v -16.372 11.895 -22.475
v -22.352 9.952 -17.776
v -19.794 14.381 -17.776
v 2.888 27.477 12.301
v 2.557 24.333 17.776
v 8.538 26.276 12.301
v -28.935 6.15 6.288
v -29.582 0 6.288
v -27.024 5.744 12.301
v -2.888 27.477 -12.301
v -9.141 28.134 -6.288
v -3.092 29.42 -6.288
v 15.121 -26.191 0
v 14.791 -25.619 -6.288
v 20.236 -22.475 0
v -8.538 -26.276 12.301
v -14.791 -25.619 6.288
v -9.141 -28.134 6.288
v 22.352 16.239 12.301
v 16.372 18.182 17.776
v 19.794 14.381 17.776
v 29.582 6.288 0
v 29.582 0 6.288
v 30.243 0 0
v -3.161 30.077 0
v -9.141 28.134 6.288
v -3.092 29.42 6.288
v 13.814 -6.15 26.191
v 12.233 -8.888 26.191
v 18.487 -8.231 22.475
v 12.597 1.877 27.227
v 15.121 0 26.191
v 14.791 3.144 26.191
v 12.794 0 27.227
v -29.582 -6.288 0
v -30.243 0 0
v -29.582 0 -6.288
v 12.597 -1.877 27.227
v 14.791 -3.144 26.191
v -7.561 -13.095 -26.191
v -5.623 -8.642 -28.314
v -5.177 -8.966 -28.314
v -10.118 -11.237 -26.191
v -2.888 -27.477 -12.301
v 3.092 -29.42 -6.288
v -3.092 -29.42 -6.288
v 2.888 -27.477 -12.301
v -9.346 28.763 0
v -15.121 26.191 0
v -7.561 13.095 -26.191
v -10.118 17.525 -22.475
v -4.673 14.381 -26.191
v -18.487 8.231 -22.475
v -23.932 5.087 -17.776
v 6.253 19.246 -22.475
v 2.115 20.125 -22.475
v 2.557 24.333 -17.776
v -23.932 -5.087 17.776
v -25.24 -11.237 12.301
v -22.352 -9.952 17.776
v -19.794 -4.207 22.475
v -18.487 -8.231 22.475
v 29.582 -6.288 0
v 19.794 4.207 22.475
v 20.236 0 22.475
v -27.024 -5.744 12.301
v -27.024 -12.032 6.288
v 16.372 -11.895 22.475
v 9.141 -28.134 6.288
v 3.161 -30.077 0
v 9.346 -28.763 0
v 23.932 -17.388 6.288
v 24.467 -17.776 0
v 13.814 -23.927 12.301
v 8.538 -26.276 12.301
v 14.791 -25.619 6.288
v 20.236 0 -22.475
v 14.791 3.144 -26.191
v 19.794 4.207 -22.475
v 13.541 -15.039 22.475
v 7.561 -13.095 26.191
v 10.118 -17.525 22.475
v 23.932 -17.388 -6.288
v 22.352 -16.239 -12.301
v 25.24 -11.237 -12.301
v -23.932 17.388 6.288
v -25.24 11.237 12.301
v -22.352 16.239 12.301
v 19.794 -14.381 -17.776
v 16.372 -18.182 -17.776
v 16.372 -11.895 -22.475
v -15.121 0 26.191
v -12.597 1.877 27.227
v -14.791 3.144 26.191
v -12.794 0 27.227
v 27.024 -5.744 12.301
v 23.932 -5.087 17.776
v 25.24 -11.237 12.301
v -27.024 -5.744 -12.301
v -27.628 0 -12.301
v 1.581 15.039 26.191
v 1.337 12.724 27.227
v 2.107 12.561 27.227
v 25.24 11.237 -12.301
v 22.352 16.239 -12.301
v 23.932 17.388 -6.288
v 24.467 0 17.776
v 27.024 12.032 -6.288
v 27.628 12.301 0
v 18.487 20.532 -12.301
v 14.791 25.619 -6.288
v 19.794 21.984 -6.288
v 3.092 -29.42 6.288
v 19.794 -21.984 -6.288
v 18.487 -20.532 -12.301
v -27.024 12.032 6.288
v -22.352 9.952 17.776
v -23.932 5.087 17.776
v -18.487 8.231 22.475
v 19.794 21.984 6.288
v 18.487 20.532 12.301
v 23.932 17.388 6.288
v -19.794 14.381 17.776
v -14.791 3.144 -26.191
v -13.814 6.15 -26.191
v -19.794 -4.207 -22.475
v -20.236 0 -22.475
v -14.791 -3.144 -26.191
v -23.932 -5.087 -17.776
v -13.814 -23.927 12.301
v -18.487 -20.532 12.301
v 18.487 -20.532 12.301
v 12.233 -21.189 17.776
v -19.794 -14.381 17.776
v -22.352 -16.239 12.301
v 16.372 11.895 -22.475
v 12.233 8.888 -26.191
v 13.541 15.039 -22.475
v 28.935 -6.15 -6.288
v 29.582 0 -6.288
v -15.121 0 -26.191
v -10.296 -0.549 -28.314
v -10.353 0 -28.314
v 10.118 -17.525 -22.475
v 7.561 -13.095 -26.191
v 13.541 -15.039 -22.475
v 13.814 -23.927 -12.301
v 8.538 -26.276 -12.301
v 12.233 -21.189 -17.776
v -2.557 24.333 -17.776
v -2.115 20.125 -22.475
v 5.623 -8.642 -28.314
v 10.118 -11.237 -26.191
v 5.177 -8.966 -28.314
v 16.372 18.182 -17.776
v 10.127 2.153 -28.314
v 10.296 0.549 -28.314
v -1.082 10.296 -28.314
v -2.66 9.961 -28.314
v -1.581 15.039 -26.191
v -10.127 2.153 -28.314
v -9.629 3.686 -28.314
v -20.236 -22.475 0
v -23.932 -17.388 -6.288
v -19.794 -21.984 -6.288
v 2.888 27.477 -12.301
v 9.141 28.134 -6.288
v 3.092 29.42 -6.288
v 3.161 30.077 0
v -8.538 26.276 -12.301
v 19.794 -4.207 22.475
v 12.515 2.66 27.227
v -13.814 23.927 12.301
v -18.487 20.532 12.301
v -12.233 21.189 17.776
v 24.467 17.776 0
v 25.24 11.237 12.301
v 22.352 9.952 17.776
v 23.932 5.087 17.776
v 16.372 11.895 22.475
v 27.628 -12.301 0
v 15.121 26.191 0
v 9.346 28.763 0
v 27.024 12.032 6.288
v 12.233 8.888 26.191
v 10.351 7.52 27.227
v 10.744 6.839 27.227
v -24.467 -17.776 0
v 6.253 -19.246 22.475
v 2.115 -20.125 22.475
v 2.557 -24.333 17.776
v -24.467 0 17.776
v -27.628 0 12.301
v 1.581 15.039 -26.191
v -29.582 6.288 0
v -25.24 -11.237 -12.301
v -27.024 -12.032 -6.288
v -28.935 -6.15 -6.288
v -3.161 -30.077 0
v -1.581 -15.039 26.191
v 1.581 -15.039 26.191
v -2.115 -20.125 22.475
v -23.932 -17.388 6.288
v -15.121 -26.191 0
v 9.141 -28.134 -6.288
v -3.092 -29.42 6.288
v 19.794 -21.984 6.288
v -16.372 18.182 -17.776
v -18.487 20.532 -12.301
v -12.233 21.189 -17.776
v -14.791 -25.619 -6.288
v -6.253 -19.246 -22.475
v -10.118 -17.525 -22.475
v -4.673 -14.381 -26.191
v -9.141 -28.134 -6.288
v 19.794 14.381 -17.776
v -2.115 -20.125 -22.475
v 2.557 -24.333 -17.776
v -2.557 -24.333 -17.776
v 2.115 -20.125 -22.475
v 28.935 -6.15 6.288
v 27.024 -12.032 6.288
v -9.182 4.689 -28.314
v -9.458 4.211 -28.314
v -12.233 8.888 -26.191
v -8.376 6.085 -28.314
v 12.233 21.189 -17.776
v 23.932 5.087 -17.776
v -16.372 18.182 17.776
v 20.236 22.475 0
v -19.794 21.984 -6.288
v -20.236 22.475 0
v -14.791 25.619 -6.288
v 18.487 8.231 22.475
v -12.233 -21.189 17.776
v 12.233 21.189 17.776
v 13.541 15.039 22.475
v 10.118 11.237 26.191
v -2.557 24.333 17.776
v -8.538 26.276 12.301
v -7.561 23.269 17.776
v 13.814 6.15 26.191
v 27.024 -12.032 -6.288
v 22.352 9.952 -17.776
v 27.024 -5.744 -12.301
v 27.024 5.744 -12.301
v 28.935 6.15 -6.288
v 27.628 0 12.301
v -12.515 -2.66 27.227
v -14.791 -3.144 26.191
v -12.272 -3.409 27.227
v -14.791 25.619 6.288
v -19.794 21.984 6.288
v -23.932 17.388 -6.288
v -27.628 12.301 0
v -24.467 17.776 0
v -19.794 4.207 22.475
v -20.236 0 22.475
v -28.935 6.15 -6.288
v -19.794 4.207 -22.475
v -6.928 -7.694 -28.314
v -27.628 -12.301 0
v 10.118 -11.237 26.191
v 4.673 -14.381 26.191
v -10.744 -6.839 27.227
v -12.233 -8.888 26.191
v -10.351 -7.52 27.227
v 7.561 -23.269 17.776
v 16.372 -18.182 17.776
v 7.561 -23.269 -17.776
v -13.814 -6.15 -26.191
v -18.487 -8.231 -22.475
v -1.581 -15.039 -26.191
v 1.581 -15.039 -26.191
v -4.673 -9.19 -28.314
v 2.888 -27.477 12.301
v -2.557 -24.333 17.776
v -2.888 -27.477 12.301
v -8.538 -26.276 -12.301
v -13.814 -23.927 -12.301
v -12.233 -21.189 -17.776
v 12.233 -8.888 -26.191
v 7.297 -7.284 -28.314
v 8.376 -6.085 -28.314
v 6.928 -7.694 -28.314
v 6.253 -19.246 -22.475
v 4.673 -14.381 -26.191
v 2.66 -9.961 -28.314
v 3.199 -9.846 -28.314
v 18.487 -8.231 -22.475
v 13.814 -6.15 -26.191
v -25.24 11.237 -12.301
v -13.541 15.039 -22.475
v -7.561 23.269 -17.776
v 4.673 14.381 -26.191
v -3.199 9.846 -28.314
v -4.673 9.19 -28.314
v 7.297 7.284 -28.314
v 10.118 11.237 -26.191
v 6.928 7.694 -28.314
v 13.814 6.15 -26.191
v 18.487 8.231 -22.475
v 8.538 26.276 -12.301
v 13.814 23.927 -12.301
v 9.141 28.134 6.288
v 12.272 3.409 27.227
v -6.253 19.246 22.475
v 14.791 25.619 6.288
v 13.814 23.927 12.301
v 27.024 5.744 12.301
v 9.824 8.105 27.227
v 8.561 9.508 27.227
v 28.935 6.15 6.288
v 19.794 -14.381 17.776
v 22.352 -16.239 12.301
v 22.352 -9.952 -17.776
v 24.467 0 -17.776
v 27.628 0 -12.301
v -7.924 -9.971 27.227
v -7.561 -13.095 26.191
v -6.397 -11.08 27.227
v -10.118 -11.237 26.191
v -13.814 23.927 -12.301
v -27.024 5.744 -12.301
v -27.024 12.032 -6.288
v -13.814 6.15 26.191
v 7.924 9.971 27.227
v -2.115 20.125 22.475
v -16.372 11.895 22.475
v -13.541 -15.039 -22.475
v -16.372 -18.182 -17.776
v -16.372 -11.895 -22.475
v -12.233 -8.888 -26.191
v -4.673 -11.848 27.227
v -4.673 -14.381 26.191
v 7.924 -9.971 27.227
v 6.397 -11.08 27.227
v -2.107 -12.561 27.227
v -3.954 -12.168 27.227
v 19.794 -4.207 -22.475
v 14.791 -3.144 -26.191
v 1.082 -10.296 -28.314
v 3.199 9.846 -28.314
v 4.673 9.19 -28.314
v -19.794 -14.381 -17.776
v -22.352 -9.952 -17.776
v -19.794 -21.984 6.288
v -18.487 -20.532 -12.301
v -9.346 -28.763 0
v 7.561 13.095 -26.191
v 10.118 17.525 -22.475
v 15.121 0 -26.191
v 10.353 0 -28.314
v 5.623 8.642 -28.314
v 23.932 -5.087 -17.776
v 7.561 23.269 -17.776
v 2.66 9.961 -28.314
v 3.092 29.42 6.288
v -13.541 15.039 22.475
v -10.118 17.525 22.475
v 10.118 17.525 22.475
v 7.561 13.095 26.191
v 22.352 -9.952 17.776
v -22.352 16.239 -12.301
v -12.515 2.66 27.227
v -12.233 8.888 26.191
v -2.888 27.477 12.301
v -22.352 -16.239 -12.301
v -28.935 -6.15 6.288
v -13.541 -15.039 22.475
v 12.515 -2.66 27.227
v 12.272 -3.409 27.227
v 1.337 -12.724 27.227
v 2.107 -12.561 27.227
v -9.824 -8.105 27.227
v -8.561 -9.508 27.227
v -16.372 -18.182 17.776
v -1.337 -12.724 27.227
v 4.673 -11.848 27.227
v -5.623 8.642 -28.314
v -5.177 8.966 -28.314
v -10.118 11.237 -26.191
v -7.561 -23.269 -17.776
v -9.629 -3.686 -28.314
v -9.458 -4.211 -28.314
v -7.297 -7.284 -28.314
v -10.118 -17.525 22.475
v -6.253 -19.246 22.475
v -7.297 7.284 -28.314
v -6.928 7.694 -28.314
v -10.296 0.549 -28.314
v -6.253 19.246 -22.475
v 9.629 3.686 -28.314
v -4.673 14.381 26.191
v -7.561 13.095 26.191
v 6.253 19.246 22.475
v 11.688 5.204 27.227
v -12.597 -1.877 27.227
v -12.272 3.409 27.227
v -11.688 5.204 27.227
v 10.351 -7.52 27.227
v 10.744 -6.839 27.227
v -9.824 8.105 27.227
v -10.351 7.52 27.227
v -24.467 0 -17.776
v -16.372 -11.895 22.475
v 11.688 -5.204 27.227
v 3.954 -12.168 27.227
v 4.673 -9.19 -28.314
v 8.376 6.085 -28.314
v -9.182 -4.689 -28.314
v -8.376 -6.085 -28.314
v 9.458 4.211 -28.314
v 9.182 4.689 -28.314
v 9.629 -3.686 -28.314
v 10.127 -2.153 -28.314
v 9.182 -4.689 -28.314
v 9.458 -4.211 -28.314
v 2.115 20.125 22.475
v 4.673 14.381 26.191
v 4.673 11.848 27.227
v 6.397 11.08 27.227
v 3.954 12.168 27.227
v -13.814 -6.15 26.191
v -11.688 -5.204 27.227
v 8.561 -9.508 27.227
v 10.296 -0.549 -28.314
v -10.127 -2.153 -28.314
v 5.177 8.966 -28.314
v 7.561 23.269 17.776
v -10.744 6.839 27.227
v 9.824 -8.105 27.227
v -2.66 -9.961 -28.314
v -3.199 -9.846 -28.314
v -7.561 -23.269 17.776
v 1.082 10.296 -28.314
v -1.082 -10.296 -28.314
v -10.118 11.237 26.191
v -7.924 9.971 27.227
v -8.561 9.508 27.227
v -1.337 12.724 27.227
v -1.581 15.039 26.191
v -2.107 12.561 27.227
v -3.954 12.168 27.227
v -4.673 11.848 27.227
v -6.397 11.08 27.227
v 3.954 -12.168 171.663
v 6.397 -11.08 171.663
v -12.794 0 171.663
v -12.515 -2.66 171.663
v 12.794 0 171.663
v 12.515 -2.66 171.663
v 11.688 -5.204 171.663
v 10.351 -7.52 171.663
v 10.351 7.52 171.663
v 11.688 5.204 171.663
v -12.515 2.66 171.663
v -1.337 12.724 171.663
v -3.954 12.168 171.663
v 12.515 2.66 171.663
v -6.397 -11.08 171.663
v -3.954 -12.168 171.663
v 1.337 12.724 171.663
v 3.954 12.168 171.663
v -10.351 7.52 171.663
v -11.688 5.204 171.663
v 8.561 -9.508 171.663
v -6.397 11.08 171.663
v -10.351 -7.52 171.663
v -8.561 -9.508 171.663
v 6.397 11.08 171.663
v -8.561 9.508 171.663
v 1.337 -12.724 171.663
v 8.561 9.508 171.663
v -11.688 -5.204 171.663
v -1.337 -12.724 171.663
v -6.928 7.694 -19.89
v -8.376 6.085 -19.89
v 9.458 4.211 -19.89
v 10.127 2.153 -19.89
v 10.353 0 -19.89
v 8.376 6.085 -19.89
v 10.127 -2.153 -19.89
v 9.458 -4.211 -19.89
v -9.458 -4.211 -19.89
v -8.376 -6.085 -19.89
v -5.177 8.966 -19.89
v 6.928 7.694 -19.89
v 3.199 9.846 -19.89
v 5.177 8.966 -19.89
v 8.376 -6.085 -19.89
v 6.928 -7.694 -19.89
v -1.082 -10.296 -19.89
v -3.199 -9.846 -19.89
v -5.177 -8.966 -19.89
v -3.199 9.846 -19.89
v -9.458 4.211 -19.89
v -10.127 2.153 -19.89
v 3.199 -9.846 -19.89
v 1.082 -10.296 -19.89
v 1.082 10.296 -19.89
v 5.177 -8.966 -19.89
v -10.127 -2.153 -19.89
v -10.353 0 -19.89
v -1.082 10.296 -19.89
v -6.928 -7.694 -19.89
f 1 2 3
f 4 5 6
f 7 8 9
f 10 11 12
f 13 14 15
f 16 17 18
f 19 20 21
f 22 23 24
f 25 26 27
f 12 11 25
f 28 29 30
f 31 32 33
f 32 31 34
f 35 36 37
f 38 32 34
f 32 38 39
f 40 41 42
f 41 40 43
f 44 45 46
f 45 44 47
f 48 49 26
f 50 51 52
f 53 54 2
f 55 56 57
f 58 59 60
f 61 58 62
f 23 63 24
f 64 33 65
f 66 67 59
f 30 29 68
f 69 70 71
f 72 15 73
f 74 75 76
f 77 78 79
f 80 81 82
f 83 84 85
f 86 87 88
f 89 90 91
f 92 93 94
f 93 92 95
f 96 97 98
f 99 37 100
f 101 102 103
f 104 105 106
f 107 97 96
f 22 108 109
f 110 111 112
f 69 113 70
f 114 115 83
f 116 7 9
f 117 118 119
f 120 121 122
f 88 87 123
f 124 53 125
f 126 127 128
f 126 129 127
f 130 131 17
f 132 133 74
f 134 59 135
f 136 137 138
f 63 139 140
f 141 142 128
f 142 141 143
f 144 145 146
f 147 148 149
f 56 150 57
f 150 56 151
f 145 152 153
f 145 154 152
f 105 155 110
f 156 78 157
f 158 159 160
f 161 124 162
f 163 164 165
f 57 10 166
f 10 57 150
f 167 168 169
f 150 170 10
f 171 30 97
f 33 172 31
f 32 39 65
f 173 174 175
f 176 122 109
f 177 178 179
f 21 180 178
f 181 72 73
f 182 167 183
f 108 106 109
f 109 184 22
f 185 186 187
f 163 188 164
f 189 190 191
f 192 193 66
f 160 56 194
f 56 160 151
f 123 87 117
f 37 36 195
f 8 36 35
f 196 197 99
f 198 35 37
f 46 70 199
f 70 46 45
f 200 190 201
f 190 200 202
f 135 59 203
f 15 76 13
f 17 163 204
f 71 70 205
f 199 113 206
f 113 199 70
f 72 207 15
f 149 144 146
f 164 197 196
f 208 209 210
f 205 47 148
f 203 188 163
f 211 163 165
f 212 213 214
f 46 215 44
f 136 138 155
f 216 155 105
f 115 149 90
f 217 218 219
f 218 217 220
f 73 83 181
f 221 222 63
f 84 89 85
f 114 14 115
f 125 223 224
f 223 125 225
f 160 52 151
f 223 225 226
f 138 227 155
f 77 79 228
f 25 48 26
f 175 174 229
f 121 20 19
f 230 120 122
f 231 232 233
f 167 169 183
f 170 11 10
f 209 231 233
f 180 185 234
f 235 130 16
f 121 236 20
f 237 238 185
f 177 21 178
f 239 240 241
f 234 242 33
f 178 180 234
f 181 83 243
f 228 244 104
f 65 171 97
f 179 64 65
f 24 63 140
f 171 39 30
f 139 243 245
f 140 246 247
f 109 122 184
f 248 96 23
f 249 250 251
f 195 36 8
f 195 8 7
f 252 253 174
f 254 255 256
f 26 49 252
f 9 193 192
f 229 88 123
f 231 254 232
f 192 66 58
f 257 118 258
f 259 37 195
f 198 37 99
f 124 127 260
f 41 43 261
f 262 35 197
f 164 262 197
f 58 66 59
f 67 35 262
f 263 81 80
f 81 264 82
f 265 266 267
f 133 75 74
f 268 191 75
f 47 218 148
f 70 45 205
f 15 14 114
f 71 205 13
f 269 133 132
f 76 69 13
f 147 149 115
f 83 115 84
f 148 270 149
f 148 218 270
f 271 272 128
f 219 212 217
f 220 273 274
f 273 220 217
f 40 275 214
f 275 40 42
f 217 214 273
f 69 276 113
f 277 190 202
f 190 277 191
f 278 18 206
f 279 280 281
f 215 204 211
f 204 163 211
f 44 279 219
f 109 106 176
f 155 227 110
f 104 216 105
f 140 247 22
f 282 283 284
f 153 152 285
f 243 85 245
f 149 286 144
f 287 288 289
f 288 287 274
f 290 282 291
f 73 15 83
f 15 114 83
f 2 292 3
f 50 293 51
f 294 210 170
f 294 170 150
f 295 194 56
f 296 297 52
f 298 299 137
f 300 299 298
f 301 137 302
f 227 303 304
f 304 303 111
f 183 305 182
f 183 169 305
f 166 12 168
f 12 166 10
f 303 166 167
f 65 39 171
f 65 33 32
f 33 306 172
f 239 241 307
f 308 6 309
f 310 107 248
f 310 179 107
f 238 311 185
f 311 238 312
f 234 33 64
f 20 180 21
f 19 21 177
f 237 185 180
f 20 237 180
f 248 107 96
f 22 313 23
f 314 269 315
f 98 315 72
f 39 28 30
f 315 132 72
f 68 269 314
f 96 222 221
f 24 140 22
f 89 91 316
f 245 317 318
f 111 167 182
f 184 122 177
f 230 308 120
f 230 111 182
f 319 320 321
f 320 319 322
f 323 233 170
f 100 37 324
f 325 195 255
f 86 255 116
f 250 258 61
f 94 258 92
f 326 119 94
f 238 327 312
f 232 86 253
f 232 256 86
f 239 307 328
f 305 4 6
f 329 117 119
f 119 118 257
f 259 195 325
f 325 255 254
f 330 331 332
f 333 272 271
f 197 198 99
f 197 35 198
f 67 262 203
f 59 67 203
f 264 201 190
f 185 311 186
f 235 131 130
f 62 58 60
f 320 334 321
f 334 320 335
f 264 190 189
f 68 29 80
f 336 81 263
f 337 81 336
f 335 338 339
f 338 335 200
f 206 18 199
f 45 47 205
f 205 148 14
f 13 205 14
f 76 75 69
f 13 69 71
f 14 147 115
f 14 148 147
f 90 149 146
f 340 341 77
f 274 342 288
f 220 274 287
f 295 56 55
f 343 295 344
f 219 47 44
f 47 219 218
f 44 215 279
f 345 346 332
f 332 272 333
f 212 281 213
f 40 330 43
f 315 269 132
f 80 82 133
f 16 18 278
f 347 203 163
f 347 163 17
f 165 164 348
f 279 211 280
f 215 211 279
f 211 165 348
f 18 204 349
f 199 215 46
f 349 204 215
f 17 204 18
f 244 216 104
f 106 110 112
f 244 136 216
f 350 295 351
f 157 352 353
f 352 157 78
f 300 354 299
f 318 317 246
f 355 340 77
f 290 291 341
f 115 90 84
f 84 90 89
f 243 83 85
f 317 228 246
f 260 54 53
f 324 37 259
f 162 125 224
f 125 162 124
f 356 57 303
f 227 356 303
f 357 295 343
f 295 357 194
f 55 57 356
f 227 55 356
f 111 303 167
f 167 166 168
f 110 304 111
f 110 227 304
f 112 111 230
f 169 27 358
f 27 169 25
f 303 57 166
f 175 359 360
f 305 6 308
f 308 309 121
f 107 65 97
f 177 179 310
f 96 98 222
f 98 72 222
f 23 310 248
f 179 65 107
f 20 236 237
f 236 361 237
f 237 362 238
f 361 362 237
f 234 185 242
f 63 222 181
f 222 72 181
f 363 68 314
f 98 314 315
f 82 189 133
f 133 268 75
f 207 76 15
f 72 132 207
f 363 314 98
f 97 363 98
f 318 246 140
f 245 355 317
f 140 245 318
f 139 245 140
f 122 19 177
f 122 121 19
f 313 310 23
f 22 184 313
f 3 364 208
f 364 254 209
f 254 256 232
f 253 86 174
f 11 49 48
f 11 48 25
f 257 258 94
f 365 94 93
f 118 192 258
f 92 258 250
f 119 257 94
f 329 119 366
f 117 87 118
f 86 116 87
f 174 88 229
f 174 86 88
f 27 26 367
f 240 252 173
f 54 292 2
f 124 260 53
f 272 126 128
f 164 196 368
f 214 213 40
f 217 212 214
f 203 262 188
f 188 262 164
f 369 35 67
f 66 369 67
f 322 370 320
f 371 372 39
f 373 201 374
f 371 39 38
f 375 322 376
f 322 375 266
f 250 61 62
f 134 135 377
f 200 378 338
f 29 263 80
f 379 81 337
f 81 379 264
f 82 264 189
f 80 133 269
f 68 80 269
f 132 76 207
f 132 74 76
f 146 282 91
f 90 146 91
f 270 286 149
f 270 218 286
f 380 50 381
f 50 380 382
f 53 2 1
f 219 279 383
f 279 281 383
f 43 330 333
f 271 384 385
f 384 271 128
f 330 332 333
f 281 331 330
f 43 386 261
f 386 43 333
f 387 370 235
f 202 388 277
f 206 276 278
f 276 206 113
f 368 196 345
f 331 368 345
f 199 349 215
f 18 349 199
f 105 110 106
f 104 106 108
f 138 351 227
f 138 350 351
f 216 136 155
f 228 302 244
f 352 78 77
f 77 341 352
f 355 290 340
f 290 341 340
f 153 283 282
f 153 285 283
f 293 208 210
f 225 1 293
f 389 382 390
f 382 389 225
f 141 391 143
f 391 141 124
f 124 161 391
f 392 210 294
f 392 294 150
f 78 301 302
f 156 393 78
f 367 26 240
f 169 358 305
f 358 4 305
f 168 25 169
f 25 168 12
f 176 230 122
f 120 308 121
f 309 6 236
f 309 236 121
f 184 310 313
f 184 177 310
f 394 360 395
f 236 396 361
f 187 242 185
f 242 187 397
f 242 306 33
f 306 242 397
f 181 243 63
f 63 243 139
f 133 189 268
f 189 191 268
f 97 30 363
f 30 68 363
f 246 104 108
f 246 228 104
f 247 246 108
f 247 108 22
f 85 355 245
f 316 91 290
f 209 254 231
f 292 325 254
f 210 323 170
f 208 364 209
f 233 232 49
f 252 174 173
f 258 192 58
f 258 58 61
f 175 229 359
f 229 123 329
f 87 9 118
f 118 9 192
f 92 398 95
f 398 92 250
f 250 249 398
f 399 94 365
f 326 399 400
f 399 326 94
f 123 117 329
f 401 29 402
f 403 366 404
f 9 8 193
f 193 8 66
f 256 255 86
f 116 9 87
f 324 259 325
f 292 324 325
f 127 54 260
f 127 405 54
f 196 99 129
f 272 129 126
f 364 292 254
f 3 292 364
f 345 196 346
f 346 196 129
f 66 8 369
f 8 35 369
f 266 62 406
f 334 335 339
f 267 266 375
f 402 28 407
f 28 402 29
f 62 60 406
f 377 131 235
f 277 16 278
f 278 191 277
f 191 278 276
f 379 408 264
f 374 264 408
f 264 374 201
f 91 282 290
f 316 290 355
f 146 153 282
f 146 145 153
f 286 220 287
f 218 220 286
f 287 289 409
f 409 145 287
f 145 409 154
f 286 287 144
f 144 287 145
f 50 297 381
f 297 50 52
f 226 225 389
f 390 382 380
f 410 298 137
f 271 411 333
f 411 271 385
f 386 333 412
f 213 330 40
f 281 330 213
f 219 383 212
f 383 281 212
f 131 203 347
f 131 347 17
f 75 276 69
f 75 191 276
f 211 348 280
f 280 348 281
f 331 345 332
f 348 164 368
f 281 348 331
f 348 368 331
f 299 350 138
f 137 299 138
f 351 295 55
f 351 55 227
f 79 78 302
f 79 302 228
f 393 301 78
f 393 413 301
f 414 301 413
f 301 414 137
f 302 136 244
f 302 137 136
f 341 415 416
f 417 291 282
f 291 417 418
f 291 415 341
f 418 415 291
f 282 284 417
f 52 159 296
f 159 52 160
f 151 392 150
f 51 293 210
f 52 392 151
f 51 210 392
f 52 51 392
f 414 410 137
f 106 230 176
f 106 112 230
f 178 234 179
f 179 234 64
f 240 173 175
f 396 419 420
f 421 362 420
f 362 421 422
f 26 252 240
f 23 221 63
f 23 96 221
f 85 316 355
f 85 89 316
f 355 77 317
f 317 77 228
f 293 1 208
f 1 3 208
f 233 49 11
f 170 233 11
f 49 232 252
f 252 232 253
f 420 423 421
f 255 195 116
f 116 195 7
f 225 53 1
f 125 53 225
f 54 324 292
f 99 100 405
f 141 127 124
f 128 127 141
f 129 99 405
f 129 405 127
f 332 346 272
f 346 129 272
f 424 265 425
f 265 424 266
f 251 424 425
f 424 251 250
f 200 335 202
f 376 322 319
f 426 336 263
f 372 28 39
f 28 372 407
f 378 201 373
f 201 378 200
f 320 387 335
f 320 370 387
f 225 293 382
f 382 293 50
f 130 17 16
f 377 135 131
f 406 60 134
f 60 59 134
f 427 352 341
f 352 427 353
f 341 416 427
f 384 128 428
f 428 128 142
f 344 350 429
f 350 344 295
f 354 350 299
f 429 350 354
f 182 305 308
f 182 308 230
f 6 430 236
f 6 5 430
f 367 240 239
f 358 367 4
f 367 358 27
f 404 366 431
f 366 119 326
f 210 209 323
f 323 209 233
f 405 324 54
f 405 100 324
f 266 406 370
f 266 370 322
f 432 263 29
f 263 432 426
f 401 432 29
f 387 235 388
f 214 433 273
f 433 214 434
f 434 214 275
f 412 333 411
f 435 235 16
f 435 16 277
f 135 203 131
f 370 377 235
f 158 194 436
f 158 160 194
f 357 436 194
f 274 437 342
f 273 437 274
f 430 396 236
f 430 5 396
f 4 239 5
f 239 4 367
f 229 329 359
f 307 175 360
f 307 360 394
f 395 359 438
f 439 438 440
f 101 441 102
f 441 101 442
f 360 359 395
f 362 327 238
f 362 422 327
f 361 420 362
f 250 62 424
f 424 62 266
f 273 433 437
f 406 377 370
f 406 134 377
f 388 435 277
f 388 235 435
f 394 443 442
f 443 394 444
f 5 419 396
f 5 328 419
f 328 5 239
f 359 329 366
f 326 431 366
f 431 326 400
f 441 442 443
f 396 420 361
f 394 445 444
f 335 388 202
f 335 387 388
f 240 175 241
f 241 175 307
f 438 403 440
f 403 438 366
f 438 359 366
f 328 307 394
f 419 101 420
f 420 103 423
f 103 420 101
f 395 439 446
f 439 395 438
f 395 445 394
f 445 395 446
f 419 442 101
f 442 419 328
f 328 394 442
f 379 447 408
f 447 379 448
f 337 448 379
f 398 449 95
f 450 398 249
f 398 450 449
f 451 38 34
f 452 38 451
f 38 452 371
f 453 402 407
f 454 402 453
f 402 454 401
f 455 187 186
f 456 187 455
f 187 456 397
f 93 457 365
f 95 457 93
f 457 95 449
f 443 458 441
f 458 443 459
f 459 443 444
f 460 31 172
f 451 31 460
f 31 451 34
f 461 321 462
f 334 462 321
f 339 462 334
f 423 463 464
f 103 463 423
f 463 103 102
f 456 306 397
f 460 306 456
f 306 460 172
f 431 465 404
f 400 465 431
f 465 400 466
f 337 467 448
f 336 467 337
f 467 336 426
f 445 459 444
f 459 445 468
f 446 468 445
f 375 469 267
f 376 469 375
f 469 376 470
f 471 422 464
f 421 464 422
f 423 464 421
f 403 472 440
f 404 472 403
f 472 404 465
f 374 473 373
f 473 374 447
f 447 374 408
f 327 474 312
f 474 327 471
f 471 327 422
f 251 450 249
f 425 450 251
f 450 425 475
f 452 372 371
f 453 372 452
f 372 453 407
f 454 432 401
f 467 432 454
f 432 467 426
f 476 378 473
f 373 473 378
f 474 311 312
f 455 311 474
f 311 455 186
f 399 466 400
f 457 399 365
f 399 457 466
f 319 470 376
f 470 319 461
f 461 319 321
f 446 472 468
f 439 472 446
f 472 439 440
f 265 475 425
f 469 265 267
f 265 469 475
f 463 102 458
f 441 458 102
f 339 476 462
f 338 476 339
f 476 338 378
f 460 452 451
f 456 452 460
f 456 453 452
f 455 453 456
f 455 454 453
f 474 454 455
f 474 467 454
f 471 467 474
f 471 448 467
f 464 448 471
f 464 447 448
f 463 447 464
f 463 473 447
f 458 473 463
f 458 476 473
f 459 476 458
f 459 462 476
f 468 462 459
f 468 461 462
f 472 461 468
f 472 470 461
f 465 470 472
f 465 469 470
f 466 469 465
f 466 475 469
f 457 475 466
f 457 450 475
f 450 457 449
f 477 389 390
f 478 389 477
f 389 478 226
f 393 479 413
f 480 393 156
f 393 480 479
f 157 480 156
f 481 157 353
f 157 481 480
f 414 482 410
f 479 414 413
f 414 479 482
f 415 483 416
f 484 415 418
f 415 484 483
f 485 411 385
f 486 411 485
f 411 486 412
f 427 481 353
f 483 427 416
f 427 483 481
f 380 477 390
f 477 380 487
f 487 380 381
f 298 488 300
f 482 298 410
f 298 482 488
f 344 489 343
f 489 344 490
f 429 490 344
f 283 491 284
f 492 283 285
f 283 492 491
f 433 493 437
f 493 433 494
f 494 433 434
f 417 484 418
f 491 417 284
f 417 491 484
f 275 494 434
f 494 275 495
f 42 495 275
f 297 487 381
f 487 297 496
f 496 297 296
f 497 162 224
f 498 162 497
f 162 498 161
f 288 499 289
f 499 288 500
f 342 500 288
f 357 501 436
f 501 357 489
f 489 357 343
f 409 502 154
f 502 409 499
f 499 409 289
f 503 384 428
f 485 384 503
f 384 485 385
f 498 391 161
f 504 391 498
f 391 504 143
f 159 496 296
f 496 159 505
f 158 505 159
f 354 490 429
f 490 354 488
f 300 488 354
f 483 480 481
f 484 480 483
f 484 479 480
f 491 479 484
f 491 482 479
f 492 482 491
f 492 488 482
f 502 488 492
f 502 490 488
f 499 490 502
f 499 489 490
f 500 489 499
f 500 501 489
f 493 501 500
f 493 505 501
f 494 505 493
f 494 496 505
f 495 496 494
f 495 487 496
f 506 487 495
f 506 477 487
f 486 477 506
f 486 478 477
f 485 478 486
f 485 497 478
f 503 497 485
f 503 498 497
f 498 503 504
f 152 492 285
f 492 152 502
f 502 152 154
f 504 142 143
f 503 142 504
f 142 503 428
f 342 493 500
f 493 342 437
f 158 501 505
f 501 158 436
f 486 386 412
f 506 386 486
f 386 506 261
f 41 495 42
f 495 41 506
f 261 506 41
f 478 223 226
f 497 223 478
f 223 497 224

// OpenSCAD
seed = 12;
seeds = rands(0,1000000,10,seed);
head_size = rands(25,50,1,seeds[1])[0];
bolt_length = rands(head_size*2,200,1,seeds[3])[0];
bolt_radius = rands(head_size/3, head_size/2,1,seeds[0])[0];
cylinder_size = rands(head_size/5, head_size/2,1, seeds[4])[0];


difference(){
    union(){
        sphere(head_size);
        cylinder(bolt_length,bolt_radius,bolt_radius);
    }
    translate([0,0,-head_size]){
        cylinder(cylinder_size*2, cylinder_size, cylinder_size, true);
    }
}
